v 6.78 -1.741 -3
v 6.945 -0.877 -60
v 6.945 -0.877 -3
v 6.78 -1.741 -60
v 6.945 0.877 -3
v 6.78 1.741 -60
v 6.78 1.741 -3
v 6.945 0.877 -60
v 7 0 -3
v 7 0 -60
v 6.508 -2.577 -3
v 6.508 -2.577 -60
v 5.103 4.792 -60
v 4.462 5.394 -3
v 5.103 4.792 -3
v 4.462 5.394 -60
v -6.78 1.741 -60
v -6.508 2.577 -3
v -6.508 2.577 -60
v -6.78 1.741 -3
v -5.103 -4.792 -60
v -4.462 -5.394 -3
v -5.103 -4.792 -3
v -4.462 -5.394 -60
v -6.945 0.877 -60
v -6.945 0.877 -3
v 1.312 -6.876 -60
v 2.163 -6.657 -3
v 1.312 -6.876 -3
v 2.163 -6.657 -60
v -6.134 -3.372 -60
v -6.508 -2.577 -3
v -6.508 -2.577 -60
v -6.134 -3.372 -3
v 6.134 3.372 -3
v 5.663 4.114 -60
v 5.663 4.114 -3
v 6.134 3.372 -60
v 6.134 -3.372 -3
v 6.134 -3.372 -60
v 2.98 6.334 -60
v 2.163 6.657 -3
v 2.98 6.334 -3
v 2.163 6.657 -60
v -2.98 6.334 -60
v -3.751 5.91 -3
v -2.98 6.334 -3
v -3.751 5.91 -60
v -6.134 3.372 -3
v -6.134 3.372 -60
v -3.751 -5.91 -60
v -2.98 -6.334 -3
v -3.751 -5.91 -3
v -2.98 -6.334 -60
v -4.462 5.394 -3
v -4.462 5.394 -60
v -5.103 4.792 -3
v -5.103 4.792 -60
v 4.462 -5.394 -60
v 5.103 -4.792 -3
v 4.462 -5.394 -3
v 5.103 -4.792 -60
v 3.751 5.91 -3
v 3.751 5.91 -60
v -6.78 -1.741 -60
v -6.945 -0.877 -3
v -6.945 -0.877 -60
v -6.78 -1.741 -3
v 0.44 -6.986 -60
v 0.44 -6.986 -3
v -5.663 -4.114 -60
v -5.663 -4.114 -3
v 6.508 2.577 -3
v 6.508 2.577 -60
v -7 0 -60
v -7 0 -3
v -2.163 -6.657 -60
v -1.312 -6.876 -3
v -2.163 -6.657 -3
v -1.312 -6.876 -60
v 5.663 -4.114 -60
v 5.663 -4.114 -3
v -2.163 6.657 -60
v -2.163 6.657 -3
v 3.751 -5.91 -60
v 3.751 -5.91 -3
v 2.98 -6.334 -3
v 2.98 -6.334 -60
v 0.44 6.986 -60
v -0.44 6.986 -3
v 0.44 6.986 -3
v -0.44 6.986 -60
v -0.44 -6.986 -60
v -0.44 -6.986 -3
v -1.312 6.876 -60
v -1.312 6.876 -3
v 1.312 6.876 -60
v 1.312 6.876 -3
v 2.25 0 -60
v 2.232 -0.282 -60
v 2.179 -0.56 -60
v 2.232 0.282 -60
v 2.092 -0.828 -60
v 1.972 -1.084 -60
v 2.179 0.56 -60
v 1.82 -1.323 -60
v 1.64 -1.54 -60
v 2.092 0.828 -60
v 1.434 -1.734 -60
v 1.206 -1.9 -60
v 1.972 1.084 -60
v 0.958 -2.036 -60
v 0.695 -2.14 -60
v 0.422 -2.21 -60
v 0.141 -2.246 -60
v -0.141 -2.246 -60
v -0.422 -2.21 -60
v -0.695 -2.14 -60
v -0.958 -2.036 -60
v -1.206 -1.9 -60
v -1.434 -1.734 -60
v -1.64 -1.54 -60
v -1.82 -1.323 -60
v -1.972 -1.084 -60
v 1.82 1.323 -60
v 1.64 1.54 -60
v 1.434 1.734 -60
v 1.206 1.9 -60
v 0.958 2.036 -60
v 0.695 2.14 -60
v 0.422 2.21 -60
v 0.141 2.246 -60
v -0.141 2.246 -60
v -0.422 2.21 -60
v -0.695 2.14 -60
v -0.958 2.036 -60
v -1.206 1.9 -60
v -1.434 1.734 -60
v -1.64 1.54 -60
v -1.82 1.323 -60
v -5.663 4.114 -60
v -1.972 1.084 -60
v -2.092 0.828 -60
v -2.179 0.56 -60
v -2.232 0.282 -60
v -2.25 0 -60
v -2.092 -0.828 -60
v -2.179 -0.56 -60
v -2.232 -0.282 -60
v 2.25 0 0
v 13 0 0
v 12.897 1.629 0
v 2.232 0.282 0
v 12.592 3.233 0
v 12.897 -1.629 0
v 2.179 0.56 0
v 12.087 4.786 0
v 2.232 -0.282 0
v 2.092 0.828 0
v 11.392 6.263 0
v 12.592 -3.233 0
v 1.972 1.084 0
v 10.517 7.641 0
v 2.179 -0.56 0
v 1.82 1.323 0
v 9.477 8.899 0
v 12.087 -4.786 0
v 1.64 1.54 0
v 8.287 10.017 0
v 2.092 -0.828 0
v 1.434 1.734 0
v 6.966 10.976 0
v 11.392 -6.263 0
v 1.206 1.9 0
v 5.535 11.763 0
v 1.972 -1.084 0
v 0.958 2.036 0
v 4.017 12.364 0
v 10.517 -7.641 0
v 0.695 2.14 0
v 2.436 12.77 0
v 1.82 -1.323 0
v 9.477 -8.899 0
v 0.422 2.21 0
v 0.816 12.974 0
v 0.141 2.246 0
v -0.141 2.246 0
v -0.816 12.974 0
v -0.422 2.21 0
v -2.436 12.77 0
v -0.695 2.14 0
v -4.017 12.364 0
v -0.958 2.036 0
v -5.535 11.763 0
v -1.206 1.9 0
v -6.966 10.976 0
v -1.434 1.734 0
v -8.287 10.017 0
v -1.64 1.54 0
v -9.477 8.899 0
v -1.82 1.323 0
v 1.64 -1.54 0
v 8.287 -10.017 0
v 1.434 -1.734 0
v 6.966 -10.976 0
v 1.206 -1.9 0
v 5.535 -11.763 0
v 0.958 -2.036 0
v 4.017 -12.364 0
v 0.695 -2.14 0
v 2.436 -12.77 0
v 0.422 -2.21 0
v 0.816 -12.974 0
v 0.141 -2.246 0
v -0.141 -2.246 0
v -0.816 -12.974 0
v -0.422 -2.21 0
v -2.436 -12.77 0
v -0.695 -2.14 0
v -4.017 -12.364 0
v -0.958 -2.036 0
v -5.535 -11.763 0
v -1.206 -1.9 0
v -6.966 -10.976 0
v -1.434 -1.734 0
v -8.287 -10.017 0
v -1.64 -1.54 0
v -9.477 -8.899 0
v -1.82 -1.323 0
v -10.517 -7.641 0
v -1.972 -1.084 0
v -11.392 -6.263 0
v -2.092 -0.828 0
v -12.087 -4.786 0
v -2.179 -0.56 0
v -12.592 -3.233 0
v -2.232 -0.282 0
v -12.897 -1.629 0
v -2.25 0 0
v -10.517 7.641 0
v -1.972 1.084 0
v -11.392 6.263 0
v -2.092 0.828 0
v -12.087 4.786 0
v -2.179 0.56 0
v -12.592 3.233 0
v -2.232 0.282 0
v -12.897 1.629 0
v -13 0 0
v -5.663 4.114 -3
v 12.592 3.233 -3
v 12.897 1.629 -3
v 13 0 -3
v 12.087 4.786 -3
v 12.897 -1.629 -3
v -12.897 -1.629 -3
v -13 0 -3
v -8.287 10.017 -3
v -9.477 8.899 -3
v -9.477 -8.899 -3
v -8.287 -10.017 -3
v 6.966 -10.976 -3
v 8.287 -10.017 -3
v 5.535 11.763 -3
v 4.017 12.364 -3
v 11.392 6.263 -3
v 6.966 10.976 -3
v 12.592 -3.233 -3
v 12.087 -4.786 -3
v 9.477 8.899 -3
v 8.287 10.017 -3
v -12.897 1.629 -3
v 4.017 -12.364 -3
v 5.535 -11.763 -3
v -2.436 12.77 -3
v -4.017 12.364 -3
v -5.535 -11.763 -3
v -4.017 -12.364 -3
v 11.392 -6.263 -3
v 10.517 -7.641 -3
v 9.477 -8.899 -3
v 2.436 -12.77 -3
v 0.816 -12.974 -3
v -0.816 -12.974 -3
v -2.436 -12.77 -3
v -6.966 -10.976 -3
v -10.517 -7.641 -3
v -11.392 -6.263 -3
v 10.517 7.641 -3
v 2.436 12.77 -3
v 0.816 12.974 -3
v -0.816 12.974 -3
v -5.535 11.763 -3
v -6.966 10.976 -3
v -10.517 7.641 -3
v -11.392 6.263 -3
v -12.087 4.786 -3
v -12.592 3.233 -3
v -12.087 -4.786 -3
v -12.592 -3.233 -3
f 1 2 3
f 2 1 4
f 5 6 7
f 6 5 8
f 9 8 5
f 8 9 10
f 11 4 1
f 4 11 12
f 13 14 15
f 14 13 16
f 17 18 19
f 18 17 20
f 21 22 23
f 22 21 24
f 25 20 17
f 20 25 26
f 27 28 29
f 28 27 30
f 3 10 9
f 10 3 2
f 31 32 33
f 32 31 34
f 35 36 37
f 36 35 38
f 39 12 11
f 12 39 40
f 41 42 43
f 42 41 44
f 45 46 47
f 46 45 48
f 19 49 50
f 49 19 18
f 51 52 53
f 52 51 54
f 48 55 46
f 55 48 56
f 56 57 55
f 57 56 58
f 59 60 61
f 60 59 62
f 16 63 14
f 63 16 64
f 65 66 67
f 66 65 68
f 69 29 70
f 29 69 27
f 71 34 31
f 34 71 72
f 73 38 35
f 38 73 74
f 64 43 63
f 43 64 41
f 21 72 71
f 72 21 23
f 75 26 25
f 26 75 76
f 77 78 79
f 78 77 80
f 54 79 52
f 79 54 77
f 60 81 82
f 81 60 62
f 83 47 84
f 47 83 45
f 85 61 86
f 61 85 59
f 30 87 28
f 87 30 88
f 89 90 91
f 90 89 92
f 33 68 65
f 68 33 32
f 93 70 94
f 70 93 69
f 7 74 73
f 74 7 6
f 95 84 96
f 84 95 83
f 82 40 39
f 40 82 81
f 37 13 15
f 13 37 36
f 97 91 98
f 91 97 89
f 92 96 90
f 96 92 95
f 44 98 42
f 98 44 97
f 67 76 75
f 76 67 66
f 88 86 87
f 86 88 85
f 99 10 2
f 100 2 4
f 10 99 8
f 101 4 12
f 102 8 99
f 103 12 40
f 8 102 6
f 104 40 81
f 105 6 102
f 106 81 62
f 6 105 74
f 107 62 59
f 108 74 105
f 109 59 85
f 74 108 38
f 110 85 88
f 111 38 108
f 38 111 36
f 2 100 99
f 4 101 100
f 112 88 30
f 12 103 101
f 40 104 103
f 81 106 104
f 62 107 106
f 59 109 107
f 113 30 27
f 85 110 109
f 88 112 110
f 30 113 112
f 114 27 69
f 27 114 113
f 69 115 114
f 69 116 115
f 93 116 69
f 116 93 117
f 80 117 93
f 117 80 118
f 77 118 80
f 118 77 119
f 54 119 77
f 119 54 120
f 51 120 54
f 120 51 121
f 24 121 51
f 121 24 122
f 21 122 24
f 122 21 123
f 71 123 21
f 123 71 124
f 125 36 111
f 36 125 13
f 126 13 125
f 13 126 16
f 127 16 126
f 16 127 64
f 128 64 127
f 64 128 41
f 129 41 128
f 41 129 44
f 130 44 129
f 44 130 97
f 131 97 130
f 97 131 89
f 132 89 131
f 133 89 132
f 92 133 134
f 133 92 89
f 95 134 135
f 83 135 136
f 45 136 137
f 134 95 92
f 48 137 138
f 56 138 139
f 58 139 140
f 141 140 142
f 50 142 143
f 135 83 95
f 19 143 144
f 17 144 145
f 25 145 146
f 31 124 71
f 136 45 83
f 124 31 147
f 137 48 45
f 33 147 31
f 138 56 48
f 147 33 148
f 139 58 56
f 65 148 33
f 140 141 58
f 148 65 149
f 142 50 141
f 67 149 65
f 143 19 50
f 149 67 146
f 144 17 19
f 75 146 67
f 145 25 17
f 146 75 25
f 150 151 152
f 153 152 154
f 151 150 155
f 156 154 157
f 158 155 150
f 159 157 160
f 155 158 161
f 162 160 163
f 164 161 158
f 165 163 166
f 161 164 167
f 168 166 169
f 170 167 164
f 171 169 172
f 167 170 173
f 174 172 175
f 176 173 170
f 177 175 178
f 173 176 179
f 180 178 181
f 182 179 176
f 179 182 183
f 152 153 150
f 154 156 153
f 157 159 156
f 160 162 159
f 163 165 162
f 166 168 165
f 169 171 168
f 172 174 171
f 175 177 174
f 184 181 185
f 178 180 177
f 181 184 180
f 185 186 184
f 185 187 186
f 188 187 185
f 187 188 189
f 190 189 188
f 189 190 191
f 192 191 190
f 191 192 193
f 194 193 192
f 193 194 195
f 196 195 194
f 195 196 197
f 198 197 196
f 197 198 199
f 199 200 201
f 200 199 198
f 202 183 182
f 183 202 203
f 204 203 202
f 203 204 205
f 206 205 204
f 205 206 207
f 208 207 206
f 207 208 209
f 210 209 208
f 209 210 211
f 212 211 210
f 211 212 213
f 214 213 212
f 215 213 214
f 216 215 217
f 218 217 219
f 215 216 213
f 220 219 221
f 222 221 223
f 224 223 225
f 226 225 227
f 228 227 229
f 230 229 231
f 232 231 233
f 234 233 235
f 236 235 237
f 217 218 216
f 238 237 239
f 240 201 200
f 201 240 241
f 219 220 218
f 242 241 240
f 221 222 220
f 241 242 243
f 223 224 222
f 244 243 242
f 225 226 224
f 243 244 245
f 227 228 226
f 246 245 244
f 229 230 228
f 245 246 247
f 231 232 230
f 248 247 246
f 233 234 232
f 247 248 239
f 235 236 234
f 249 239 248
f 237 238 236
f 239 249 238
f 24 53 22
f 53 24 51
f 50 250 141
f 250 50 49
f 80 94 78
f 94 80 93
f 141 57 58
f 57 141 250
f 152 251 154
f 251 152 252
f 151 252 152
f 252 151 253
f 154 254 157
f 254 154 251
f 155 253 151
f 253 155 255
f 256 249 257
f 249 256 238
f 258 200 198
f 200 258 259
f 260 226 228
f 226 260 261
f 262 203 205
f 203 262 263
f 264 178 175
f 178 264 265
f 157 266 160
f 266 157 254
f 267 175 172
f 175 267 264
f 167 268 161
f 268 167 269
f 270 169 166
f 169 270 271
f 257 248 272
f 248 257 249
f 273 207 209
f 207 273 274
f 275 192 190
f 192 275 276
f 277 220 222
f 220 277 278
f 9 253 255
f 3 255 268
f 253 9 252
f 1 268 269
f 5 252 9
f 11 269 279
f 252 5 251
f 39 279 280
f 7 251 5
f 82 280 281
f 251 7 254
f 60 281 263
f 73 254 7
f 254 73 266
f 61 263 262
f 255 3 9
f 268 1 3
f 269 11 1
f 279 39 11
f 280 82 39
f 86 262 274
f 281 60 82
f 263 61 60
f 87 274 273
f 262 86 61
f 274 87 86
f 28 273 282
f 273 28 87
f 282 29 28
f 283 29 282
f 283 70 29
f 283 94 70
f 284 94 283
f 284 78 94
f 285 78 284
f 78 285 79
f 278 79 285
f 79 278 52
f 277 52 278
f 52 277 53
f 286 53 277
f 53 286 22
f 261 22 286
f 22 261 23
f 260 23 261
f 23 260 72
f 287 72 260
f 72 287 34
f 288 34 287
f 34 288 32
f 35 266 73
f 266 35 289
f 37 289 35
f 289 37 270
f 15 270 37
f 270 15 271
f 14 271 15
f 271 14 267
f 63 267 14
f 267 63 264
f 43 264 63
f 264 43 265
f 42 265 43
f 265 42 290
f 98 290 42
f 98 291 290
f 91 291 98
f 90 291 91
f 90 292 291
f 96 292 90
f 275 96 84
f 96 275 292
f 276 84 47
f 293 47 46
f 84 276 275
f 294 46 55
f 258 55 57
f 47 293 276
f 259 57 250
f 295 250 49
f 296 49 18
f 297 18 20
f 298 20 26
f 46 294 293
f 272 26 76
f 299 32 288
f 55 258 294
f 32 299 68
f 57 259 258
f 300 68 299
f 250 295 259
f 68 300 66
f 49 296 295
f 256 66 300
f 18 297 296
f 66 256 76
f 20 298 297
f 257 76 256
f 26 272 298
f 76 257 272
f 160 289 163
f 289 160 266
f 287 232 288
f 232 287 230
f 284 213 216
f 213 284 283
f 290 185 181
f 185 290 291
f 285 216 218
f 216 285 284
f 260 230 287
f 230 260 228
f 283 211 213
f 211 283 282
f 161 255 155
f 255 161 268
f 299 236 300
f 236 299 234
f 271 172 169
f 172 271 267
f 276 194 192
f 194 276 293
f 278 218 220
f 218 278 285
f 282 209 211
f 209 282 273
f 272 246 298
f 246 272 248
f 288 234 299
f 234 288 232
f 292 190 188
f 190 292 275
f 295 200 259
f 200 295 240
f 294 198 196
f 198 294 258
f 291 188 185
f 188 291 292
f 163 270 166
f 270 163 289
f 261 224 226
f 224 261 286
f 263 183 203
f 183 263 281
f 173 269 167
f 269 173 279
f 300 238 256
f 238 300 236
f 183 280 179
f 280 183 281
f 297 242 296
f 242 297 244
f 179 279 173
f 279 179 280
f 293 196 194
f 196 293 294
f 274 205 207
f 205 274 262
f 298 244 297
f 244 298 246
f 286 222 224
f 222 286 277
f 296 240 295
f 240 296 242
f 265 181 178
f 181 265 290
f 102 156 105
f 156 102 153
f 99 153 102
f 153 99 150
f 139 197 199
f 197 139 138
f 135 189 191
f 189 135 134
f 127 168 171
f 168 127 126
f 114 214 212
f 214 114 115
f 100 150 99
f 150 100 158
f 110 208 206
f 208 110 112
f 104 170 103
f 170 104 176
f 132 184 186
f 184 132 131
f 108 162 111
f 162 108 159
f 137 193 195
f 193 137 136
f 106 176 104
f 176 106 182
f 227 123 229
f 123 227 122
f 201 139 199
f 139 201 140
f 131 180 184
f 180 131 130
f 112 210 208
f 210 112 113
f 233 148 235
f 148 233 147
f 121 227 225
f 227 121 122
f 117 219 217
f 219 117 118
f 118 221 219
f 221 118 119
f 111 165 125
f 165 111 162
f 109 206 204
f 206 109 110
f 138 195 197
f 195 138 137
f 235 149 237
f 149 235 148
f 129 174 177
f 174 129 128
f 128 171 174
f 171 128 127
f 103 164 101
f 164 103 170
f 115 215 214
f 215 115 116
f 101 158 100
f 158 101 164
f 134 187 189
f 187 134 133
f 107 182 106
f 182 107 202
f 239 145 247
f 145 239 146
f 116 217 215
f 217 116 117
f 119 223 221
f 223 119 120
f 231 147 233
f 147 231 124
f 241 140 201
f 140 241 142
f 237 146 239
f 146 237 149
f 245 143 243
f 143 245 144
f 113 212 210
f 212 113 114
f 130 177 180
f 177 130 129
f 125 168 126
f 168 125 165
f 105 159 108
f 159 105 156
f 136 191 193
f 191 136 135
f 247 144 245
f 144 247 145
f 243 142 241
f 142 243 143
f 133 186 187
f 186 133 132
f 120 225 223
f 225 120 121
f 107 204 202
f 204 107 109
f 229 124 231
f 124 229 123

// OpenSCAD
$fn = 50;


difference() {
	union() {
		translate(v = [0, 0, -60.0000000000]) {
			cylinder(h = 60, r = 7.0000000000);
		}
		translate(v = [0, 0, -3.0000000000]) {
			cylinder(h = 3, r = 13.0000000000);
		}
	}
	union() {
		#translate(v = [0, 0, -60]) {
			cylinder(h = 60, r = 2.2500000000);
		}
	}
}
